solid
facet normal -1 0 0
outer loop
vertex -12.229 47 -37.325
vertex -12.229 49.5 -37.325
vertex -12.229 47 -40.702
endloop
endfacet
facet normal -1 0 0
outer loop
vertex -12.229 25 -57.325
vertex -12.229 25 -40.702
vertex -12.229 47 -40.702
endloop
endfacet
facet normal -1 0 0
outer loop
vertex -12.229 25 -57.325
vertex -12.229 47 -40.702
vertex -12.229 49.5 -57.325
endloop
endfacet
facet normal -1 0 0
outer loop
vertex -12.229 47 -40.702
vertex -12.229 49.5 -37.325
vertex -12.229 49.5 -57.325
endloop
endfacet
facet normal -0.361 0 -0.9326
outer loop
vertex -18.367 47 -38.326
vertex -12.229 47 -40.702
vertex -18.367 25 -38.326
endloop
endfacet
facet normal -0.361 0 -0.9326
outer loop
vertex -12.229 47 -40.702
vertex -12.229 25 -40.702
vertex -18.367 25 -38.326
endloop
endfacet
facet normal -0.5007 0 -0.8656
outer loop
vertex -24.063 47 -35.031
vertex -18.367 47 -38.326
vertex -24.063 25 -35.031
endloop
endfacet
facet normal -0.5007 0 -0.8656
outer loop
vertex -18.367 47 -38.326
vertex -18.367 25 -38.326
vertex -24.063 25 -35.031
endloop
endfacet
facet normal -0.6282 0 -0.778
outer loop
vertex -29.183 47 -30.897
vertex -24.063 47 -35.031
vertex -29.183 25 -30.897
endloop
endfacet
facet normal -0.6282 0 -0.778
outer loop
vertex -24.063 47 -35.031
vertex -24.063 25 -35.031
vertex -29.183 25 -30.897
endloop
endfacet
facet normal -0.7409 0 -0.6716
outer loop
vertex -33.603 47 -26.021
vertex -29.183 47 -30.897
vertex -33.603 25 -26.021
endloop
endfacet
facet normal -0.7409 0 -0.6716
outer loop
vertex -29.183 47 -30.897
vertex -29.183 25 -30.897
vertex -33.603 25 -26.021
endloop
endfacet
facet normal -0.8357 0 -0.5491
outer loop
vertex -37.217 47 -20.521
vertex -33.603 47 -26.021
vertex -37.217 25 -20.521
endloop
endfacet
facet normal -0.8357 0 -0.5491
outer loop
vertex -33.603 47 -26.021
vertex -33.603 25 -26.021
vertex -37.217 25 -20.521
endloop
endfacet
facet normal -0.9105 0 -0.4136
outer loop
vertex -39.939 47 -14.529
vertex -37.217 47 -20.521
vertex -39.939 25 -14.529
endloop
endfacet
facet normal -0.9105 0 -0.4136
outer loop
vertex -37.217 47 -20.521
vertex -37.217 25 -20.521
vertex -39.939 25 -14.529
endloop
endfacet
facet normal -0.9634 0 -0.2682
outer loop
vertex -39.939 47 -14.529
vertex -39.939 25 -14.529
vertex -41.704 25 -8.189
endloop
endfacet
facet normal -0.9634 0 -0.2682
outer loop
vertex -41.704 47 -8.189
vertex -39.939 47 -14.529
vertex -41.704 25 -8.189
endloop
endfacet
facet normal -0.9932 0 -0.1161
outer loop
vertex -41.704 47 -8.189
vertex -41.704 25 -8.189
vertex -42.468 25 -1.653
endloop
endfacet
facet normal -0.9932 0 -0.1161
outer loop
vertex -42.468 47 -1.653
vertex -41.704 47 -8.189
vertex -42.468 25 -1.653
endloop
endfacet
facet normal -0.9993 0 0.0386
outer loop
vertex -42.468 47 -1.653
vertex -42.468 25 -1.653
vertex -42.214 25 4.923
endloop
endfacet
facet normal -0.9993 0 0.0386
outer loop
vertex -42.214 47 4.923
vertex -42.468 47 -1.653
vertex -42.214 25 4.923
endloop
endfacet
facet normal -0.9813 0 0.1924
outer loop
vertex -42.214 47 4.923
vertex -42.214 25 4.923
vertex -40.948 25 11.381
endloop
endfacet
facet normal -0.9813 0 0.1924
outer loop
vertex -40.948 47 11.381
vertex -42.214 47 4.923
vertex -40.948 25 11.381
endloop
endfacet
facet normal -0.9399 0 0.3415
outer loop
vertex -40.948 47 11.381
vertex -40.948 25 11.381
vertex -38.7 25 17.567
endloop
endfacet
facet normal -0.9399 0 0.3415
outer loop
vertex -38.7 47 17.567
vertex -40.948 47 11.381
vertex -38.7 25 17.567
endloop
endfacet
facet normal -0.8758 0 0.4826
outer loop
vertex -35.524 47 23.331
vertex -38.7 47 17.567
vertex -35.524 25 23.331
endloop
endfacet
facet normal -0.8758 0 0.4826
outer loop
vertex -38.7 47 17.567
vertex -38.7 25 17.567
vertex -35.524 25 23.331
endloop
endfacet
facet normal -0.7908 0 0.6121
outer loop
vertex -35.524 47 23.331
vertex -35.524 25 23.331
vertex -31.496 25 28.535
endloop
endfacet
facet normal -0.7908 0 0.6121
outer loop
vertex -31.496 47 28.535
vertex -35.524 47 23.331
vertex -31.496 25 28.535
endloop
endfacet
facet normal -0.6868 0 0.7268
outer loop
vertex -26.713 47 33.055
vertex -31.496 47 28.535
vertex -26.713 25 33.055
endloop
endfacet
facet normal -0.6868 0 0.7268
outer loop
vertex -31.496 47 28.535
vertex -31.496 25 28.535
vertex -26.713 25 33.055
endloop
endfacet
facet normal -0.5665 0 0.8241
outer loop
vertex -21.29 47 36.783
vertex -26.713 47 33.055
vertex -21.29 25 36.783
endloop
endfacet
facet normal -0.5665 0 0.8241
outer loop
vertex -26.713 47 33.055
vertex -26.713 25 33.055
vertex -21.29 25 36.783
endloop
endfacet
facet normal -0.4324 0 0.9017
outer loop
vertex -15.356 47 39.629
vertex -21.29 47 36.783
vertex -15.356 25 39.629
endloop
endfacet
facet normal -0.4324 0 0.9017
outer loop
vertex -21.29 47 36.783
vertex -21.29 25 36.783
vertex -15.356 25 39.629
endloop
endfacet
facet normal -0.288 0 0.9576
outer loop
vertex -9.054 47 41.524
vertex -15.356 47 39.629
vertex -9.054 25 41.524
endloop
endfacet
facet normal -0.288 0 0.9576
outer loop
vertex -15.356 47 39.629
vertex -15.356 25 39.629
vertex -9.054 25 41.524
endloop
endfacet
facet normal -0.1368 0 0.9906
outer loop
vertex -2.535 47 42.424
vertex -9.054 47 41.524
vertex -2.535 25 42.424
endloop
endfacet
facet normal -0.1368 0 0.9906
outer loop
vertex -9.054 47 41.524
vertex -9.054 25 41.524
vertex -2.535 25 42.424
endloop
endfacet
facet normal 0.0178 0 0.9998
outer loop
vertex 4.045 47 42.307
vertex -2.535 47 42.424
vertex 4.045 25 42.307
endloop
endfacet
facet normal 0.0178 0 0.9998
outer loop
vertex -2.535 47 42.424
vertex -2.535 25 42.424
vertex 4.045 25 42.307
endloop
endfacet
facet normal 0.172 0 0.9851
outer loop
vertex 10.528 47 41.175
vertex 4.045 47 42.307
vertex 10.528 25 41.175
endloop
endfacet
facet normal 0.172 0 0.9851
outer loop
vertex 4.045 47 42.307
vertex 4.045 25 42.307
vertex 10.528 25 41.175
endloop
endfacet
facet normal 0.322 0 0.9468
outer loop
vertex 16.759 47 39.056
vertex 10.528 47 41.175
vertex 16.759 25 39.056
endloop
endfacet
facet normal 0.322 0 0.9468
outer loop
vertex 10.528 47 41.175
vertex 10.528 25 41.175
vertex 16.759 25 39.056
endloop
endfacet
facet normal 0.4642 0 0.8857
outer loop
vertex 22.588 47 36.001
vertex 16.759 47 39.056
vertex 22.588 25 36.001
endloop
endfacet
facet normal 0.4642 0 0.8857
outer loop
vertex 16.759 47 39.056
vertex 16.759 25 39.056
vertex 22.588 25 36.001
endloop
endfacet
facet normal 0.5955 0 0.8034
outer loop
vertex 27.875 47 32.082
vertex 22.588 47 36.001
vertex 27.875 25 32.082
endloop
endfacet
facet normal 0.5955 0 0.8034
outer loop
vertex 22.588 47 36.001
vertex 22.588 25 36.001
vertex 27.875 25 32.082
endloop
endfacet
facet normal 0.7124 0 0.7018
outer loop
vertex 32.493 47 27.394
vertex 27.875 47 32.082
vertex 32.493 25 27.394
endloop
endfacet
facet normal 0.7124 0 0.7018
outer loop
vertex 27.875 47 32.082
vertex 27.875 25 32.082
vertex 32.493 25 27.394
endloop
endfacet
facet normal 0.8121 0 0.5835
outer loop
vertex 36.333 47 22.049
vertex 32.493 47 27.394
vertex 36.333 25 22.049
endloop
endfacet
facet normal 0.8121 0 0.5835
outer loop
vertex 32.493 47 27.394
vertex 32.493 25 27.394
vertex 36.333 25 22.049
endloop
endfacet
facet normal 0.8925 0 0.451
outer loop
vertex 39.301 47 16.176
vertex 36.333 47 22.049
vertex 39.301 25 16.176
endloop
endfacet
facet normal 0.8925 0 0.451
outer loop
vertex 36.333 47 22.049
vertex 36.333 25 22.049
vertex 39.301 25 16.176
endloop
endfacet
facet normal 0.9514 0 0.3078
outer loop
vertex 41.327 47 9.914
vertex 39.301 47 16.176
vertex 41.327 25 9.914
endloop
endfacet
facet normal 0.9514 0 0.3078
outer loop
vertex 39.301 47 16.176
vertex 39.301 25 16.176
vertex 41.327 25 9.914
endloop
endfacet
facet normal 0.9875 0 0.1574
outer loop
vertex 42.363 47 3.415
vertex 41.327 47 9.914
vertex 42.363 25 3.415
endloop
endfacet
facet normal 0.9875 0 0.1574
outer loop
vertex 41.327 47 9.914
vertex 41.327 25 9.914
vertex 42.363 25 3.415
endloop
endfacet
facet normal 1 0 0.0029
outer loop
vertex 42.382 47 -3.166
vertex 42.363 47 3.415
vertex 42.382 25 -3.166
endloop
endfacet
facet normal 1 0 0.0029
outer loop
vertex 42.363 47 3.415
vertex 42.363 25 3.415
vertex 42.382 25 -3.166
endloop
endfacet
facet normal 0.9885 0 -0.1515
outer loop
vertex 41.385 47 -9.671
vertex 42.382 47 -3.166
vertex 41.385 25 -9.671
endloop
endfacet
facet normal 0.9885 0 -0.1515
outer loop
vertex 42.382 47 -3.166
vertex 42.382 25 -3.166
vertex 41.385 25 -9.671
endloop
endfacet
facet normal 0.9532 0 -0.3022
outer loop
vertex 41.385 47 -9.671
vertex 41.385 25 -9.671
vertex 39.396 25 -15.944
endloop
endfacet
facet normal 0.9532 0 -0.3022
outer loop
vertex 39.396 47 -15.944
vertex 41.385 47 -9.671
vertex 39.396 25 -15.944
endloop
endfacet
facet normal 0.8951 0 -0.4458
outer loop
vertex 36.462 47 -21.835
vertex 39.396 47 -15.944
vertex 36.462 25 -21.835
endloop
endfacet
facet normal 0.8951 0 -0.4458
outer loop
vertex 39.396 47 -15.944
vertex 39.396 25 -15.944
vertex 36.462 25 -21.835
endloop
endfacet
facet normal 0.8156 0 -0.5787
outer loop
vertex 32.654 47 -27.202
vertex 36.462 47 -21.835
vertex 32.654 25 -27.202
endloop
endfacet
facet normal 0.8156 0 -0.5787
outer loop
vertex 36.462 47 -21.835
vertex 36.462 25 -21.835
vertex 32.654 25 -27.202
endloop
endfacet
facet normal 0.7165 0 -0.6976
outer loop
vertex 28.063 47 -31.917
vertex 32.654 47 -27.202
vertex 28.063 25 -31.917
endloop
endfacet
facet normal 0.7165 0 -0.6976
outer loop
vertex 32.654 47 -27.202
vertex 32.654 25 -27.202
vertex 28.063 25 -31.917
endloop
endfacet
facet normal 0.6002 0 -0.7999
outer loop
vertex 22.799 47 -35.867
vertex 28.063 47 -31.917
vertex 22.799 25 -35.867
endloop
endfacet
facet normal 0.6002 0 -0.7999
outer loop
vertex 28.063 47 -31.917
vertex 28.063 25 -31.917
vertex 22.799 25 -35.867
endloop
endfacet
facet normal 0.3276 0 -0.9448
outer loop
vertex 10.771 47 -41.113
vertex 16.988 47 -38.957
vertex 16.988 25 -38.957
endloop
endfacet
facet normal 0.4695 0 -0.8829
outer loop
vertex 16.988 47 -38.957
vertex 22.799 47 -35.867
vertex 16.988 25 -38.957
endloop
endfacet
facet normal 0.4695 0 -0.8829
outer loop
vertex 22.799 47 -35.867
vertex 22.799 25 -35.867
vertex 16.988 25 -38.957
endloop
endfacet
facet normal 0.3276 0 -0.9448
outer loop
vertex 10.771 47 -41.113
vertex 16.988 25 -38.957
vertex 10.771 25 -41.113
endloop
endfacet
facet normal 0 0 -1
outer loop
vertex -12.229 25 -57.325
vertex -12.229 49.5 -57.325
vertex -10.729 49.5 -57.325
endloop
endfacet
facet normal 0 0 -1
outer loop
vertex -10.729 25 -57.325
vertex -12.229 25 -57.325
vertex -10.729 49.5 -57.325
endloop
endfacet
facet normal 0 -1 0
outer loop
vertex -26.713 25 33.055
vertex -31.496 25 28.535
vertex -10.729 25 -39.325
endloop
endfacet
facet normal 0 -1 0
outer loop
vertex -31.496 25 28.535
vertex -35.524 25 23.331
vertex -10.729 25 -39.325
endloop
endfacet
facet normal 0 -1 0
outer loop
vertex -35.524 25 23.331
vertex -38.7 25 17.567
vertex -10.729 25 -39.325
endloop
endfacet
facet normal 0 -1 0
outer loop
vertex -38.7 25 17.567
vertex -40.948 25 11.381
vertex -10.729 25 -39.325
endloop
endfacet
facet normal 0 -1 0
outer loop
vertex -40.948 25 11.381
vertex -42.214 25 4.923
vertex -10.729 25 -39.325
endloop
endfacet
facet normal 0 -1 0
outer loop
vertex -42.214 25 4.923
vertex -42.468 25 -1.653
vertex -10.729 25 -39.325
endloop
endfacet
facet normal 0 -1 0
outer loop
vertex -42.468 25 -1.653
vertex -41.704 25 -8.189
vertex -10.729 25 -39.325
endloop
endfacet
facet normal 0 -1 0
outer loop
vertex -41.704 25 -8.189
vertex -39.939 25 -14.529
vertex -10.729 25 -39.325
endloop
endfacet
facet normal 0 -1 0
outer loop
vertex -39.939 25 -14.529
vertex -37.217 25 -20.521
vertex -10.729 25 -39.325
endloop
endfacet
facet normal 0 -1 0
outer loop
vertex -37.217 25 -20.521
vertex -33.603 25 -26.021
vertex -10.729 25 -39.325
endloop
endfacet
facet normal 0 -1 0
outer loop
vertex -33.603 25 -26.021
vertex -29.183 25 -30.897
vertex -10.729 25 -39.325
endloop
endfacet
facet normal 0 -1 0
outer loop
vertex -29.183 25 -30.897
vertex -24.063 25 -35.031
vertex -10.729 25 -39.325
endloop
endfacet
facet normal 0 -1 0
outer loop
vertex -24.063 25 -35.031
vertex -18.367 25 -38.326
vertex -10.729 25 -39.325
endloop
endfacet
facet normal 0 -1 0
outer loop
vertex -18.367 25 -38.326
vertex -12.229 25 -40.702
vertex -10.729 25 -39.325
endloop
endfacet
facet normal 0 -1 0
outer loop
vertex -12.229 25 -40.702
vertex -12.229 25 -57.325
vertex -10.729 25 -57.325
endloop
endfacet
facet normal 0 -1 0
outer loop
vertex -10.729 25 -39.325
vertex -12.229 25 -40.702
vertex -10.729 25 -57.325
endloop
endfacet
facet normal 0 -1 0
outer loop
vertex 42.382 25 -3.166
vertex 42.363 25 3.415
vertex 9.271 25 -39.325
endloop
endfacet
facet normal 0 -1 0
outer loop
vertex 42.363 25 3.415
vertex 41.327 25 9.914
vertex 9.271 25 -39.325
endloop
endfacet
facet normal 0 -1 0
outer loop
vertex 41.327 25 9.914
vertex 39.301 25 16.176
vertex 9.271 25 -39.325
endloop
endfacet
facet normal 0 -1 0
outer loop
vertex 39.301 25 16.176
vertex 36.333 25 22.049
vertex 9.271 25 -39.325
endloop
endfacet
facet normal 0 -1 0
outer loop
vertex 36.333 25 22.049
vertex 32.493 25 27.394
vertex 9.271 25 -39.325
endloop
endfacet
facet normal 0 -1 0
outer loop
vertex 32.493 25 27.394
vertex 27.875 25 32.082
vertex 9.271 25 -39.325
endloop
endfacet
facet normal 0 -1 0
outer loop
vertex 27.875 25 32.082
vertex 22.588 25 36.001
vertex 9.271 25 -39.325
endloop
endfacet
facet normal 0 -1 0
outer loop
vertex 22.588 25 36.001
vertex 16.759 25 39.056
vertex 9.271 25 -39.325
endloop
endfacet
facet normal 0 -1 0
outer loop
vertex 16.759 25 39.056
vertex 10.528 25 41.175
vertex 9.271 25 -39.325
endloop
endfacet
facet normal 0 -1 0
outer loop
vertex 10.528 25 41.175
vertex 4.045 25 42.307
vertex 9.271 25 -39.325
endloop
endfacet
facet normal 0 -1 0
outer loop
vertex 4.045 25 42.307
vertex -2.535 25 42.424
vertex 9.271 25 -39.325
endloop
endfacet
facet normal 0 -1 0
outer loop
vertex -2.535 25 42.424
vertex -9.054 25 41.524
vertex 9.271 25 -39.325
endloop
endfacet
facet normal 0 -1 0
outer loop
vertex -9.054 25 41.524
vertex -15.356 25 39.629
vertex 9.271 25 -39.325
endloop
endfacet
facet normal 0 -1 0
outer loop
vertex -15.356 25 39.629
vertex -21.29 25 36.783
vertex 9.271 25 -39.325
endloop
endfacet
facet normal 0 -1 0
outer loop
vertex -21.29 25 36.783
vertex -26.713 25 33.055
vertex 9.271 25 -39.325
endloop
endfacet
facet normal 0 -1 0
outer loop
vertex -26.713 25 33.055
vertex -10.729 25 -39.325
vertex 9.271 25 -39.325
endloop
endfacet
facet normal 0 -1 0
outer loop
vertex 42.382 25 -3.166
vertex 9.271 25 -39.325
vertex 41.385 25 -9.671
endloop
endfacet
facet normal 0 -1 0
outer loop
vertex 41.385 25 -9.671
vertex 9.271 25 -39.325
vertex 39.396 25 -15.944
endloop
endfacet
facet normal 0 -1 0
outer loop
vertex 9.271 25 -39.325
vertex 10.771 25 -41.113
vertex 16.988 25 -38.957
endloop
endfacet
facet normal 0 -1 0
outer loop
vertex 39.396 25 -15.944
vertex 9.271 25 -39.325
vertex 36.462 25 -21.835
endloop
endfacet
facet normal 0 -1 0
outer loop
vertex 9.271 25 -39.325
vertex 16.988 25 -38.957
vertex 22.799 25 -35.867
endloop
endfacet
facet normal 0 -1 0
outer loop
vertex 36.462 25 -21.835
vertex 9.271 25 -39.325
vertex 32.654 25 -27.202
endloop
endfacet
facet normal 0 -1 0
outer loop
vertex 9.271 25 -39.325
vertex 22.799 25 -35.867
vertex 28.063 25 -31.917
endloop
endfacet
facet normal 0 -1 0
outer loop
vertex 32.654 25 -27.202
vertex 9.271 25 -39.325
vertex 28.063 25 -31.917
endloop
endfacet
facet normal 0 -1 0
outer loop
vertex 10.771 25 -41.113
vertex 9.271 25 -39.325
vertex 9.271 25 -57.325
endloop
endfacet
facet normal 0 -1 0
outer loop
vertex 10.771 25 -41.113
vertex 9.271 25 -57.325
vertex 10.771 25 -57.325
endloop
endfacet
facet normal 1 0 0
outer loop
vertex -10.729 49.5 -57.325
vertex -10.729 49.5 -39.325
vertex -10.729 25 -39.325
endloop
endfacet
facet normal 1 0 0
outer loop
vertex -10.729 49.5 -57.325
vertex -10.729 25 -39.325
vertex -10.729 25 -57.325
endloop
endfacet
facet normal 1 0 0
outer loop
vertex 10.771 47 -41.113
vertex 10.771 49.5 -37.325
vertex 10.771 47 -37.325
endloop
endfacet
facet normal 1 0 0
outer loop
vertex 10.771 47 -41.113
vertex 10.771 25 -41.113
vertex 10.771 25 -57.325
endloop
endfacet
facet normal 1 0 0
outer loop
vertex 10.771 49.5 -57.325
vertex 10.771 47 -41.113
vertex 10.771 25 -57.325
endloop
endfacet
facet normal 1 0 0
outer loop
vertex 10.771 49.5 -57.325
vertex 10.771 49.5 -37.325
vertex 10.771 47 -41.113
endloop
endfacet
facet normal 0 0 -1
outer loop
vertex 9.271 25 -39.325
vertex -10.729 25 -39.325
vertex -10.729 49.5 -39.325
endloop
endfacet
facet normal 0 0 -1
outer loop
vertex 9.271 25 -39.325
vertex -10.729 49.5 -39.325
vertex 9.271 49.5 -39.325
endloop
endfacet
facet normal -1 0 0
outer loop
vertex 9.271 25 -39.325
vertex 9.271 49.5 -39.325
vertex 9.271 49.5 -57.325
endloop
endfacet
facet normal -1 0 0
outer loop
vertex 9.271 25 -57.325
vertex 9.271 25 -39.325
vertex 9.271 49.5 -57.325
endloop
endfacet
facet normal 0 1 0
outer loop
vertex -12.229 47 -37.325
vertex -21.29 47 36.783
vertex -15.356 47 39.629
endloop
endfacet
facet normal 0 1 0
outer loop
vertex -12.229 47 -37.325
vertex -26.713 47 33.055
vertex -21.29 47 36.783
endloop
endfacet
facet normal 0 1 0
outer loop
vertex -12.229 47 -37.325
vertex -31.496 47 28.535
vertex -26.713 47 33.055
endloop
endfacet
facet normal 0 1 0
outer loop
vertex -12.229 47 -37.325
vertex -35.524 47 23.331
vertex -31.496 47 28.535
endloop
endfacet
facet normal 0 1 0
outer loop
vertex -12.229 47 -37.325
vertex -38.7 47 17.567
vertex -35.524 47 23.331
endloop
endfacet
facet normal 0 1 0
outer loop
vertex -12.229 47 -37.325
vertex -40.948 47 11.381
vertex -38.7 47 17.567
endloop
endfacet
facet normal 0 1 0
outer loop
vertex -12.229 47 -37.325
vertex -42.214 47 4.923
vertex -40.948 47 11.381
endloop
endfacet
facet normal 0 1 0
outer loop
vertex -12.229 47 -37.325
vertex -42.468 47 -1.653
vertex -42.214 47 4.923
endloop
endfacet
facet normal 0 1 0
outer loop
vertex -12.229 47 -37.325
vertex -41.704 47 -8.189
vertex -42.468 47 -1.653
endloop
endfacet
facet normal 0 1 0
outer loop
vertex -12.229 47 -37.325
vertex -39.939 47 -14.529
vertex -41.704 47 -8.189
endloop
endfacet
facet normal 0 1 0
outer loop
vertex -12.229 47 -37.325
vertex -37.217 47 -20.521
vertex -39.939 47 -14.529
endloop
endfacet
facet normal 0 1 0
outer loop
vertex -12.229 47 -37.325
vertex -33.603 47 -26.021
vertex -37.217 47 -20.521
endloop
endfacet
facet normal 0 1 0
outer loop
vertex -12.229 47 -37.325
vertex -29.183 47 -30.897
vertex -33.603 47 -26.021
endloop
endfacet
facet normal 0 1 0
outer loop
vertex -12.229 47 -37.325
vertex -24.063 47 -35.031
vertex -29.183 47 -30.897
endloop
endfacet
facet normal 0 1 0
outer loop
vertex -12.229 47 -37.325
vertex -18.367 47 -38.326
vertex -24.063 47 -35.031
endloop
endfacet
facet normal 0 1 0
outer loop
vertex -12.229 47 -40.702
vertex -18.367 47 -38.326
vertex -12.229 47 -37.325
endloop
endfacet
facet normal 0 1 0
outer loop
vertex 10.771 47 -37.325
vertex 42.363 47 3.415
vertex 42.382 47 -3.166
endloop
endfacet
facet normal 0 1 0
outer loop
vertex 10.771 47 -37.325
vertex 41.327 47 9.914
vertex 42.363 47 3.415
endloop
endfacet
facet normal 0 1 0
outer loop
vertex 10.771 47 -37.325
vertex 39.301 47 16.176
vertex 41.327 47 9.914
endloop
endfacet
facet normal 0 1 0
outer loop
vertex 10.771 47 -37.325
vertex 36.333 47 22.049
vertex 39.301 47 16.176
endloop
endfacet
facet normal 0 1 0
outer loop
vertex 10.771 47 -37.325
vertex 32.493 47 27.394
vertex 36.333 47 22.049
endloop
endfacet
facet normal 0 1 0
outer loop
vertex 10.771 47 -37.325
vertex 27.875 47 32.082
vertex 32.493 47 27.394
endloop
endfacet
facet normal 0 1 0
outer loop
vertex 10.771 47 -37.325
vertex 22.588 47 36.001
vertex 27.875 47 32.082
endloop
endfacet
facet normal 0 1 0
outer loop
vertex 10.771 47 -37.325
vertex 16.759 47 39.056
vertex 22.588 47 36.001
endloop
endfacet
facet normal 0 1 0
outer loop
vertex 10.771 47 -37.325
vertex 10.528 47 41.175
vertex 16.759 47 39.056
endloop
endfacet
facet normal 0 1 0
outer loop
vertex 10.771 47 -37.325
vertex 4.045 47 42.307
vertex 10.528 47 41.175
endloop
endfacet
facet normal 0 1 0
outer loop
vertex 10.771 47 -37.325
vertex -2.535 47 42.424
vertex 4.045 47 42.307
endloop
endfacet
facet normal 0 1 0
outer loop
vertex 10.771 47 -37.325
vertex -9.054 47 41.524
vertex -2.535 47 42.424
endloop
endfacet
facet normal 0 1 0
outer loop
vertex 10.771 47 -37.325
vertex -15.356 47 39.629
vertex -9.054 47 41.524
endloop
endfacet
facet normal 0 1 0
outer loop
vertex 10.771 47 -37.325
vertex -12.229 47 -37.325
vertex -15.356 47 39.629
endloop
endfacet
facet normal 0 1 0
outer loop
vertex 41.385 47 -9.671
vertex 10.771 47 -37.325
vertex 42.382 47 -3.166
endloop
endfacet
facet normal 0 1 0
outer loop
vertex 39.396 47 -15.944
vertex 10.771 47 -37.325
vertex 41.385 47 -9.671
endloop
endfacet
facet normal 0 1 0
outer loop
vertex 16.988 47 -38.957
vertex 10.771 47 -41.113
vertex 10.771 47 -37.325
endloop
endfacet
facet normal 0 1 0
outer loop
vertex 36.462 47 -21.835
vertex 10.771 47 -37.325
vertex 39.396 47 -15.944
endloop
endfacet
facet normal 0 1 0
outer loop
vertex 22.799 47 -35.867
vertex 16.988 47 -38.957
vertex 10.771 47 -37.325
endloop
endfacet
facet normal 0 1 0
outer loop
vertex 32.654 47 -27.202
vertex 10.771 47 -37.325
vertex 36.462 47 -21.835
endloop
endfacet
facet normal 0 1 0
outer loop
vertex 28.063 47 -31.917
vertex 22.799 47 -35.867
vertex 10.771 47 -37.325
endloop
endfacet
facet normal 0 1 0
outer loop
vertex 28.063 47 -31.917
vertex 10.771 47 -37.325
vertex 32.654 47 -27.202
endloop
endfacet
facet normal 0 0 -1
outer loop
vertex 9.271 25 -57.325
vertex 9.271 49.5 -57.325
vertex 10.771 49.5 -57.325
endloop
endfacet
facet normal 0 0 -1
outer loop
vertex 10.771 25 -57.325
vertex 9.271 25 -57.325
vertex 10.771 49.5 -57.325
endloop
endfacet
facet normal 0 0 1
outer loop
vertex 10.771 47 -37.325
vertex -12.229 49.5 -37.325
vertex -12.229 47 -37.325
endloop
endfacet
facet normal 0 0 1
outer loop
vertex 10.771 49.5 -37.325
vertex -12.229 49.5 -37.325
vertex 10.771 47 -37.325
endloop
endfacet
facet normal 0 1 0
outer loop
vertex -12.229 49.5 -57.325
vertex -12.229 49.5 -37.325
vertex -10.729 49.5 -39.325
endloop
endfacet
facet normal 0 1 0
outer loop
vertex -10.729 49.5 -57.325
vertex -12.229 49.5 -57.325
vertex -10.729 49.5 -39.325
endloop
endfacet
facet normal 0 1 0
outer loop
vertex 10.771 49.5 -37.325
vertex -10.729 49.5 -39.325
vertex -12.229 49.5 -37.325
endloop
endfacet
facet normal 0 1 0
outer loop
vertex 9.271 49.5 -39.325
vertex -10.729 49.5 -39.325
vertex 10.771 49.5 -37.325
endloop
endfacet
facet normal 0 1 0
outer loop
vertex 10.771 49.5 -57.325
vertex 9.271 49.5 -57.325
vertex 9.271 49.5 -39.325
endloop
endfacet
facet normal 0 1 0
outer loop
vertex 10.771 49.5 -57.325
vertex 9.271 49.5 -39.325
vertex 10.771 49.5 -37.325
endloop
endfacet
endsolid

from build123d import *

# Parameters (mm, degrees)
BOSS_EXTRUDE5_OUTLINE_R = 42.5
BOSS_EXTRUDE5_DEPTH     = 22
SKETCH11_W              = 23
SKETCH11_H              = 20
BOSS_EXTRUDE6_DEPTH     = 22
SKETCH12_W              = 23
SKETCH12_H              = 20
CUT_EXTRUDE1_DEPTH      = 19.5
SKETCH13_W              = 20
SKETCH13_H              = 18
CUT_EXTRUDE2_DEPTH      = 39


# Read off the part's stored shape, not the designer's step: Boss-Extrude5
with BuildPart() as part:
    # Boss-Extrude5 outline → Boss-Extrude5 (new body)
    with BuildSketch(Plane(origin=(0, 25, 0), x_dir=(1, 0, 0), z_dir=(0, 1, 0))):
        Circle(BOSS_EXTRUDE5_OUTLINE_R)
    extrude(amount=BOSS_EXTRUDE5_DEPTH)

    # Sketch11 → Boss-Extrude6 (add, symmetric)
    with BuildSketch(Plane(origin=(0, 47, 0), x_dir=(1, 0, 0), z_dir=(0, 1, 0))):
        with Locations((-0.729469309, 47.32480688)):
            Rectangle(SKETCH11_W, SKETCH11_H)
    extrude(amount=BOSS_EXTRUDE6_DEPTH, both=True)

    # Sketch12 → Cut-Extrude1 (cut, symmetric)
    with BuildSketch(Plane(origin=(0, 69, 0), x_dir=(1, 0, 0), z_dir=(0, 1, 0))):
        with Locations((-0.729469309, 47.32480688)):
            Rectangle(SKETCH12_W, SKETCH12_H)
    extrude(amount=CUT_EXTRUDE1_DEPTH, both=True, mode=Mode.SUBTRACT)

    # Sketch13 → Cut-Extrude2 (cut)
    with BuildSketch(Plane(origin=(0, 49.5, 0), x_dir=(1, 0, 0), z_dir=(0, 1, 0))):
        with Locations((-0.729469309, 48.32480688)):
            Rectangle(SKETCH13_W, SKETCH13_H)
    extrude(amount=-CUT_EXTRUDE2_DEPTH, mode=Mode.SUBTRACT)


solid = part.part
